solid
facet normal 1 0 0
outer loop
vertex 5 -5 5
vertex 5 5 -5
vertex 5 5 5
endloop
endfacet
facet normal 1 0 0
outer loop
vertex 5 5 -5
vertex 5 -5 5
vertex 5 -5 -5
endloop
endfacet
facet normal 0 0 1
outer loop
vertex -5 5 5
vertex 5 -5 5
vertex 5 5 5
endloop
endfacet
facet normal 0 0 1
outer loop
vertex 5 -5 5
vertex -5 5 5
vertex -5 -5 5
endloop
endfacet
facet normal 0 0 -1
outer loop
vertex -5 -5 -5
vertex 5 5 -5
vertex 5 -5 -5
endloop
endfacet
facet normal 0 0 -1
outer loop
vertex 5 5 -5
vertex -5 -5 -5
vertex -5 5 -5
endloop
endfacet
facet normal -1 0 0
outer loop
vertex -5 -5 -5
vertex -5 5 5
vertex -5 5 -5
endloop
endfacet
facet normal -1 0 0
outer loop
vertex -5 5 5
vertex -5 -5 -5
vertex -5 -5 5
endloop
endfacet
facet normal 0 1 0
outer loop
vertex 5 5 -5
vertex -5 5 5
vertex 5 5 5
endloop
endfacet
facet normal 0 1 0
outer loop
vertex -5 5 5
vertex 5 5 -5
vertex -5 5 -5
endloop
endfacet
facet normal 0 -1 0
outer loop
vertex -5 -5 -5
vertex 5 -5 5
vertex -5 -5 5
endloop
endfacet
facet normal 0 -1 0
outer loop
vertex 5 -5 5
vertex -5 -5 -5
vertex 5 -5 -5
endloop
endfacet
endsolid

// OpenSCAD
// -------------------------------------+---------------------------------------+---------------------------------------+---------------------------------------
// Title:        Parametric Test Block
// Version:      1.2
// Release Date: 2018-07-28 (ISO 8601)
// Author:       Rohin Gosling
// -------------------------------------+---------------------------------------+---------------------------------------+---------------------------------------
//
// Description:
//
// - Simple 3D object generator, to generate test and calibration parts for 3D printers.
//
// Release Notes:
//
// - Version 1.1
//   * Removed extended ASCII characters to make the source code compatible with the UTF-8 encoding required by the Thingiverse Customizer.
//
// - Version 1.0
//   * Model created.
//
// -------------------------------------+---------------------------------------+---------------------------------------+---------------------------------------

// -------------------------------------+---------------------------------------+---------------------------------------+---------------------------------------
// Constants:
// -------------------------------------+---------------------------------------+---------------------------------------+---------------------------------------

// System constants.

C_CONSTANT = 0 + 0;     // Used to hide constant values from Thingiverse. Add to other constants to hide them as well.

// General constants.

C_NONE = C_CONSTANT + 0;

// SCG constants.

SCG_OVERLAP = C_CONSTANT + 0.01;    // Used for overlapping Boolean operations in order to avoid Boolean edge artefacts.

// Shape

C_SHAPE_NONE      = C_CONSTANT + 0;
C_SHAPE_CUBOID    = C_CONSTANT + 1;
C_SHAPE_CYLINDER  = C_CONSTANT + 2;
C_SHAPE_PYRAMID   = C_CONSTANT + 3;
C_SHAPE_PRISM     = C_CONSTANT + 4;
C_SHAPE_ELLIPSOID = C_CONSTANT + 5;
C_SHAPE_TORUS     = C_CONSTANT + 6;

// Minimum and maximum constraints.

C_RESOLUTION_MIN  = C_CONSTANT + 8;
C_RESOLUTION_MAX  = C_CONSTANT + 64;
C_SIZE_MIN        = C_CONSTANT + 1.0;
C_SIDE_COUNT_MIN  = C_CONSTANT + 3;
C_SIDE_COUNT_MAX  = C_CONSTANT + 12;


// -------------------------------------+---------------------------------------+---------------------------------------+---------------------------------------
// Thingiverse Parameters.
//
// - These parameters are used to integrate with the Thingiverse Customizer, and should only be used by the
//   class member variables specified in the "Model parameters" section below.
//
// - These Thingiverse Parameters should never be accessed from inside any module. We do this to enforce 
//   principles of object orientation.
//
// - By separating concerns between variables exposed to Thingiverse vs. variables used internally by the 
//   SCAD model (class), we are better able to manage the ordering and grouping of variables exposed to 
//   Thingiverse, vs. the ordering and constraints of variables used internally by the model.
//
// -------------------------------------+---------------------------------------+---------------------------------------+---------------------------------------

/* [Assembbly Parameters] */

object_shape    = 1;        // [ 1:Cuboid, 2:Cylinder, 3:Pyramid, 4:Prism, 5:Ellipsoid, 6:Torus ]
x_bore_shape    = 0;        // [ 0: None, 2:Cylinder, 4:Prism ]
y_bore_shape    = 0;        // [ 0: None, 2:Cylinder, 4:Prism ]
z_bore_shape    = 0;        // [ 0: None, 2:Cylinder, 4:Prism ]
resolution      = 128;

/* [Cuboid Parameters] */

cuboid_x      = 10.0;
cuboid_y      = 10.0;
cuboid_z      = 10.0;
cuboid_fillet = 0.0;

/* [Cylinder Parameters] */

cylinder_diameter_base = 20.0;
cylinder_diameter_top  = 20.0;
cylinder_height        = 20.0;

/* [Pyramid Parameters] */

pyramid_side_count  = 4;
pyramid_side_length = 20.0;
pyramid_height      = 20.0;

/* [Prism Parameters] */

prism_side_count  = 3;
prism_side_length = 20.0;
prism_height      = 20.0;

/* [Ellipsoid Parameters] */

ellipsoid_diameter_x = 20.0;
ellipsoid_diameter_y = 20.0;
ellipsoid_diameter_z = 20.0;

/* [Torus Parameters] */

torus_major_radius = 12.0;
torus_minor_radius = 6.0;

/* [Bore Parameters] */

x_bore_diameter         = 10;
y_bore_diameter         = 10;
z_bore_diameter         = 10;
x_bore_prism_side_count = 4;
y_bore_prism_side_count = 4;
z_bore_prism_side_count = 4;

// -------------------------------------+---------------------------------------+---------------------------------------+---------------------------------------
// Model parameters and geometric constraints. (Class member variables).
//
// - If we treat an OpenSCAD file as though it is an object oriented class, then we can prefix global variables
//   with "m_", to denote class membership. 
//   - As an alternative to "m_", we could also use "this_" as a standard. However, "m_" is shorter and faster to type.
//   - Another advantage of this convention, is that we can arrange parameters meant for display in Thingiverse, in 
//     an order that makes sense to the user, while arranging the member versions of the parameters in an order
//     that better accommodates constraint computation.
//
// - Once we have defined global variables as member variables of a class, in this case the class represented
//   by the SCAD file, then we are free to better manage global vs local scope of class member 
//   variables, vs. local module (method) variables.
//
// - Thingiverse only integrates constant literal values. So as long as we reference other parameters or 
//   initialize variables as expressions, then none of these will appear in the Thingiverse customizer.
//
// -------------------------------------+---------------------------------------+---------------------------------------+---------------------------------------

// Assembly Parameters

m_object_shape    = object_shape;
m_x_bore_shape    = x_bore_shape;
m_y_bore_shape    = y_bore_shape;
m_z_bore_shape    = z_bore_shape;
m_resolution      = clip ( resolution, C_RESOLUTION_MIN, C_RESOLUTION_MAX );

// Cuboid Parameters.

m_cuboid_x             = ( cuboid_x < C_SIZE_MIN ) ? C_SIZE_MIN : cuboid_x;
m_cuboid_y             = ( cuboid_y < C_SIZE_MIN ) ? C_SIZE_MIN : cuboid_y;
m_cuboid_z             = ( cuboid_z < C_SIZE_MIN ) ? C_SIZE_MIN : cuboid_z;
m_cuboid_min_dimention = ( m_cuboid_x < m_cuboid_y && m_cuboid_x < m_cuboid_z ) ? m_cuboid_x : ( m_cuboid_y < m_cuboid_x && m_cuboid_y < m_cuboid_z ) ? m_cuboid_y : m_cuboid_z;
m_cuboid_fillet        = clip ( cuboid_fillet, 0.0, m_cuboid_min_dimention/2.0 );

// Cylinder Parameters.

m_cylinder_diameter_base = ( cylinder_diameter_base < 0.0 ) ? 0.0 : cylinder_diameter_base;
m_cylinder_diameter_top  = ( cylinder_diameter_top  < 0.0 ) ? 0.0 : cylinder_diameter_top;
m_cylinder_height        = ( cylinder_height < C_SIZE_MIN ) ? C_SIZE_MIN : cylinder_height;

// Pyramid Parameters.

m_pyramid_side_count  = clip ( pyramid_side_count, C_SIDE_COUNT_MIN, C_SIDE_COUNT_MAX );
m_pyramid_side_length = ( pyramid_side_length < C_SIZE_MIN ) ? C_SIZE_MIN : pyramid_side_length;
m_pyramid_height      = ( pyramid_height < C_SIZE_MIN ) ? C_SIZE_MIN : pyramid_height;

// Prism Parameters.

m_prism_side_count  = clip ( prism_side_count, C_SIDE_COUNT_MIN, C_SIDE_COUNT_MAX );
m_prism_side_length = ( prism_side_length < C_SIZE_MIN ) ? C_SIZE_MIN : prism_side_length;
m_prism_height      = ( prism_height < C_SIZE_MIN ) ? C_SIZE_MIN : prism_height;

// Ellipsoid Parameters.

m_ellipsoid_diameter_x = ( ellipsoid_diameter_x < C_SIZE_MIN ) ? C_SIZE_MIN : ellipsoid_diameter_x;
m_ellipsoid_diameter_y = ( ellipsoid_diameter_y < C_SIZE_MIN ) ? C_SIZE_MIN : ellipsoid_diameter_y;
m_ellipsoid_diameter_z = ( ellipsoid_diameter_z < C_SIZE_MIN ) ? C_SIZE_MIN : ellipsoid_diameter_z;

// Torus Parameters.

m_torus_major_radius = ( torus_major_radius < C_SIZE_MIN ) ? C_SIZE_MIN : torus_major_radius;
m_torus_minor_radius = ( torus_minor_radius < C_SIZE_MIN ) ? C_SIZE_MIN : torus_minor_radius;

// Bore.

m_x_bore_diameter         = ( x_bore_diameter < C_SIZE_MIN ) ? C_SIZE_MIN : x_bore_diameter;
m_y_bore_diameter         = ( y_bore_diameter < C_SIZE_MIN ) ? C_SIZE_MIN : y_bore_diameter;
m_z_bore_diameter         = ( z_bore_diameter < C_SIZE_MIN ) ? C_SIZE_MIN : z_bore_diameter;
m_x_bore_prism_side_count = clip ( x_bore_prism_side_count, C_SIDE_COUNT_MIN, C_SIDE_COUNT_MAX );
m_y_bore_prism_side_count = clip ( y_bore_prism_side_count, C_SIDE_COUNT_MIN, C_SIDE_COUNT_MAX );
m_z_bore_prism_side_count = clip ( z_bore_prism_side_count, C_SIDE_COUNT_MIN, C_SIDE_COUNT_MAX );

// -------------------------------------+---------------------------------------+---------------------------------------+---------------------------------------
// DEBUG: Console Output. 
// -------------------------------------+---------------------------------------+---------------------------------------+---------------------------------------

C_DEBUG_ENABLED = false;

if ( C_DEBUG_ENABLED )
{
    //echo ( m_x = m_x ); 
}

// -------------------------------------+---------------------------------------+---------------------------------------+---------------------------------------
// Module:      Main
// Module Type: Model
//
// Description:
//
// - Program entry point.
//
// -------------------------------------+---------------------------------------+---------------------------------------+---------------------------------------

main();

module main ()
{   
    // Initialize model resolution.
    
    $fn = m_resolution;
    
    // Generate hinge assembly.
        
    assembly ();    
}

// -------------------------------------+---------------------------------------+---------------------------------------+---------------------------------------
// Module:      assembly_main
// Module Type: Assembly
//
// Description:
//
// - Main component assembly.
//
// Parameters:
//
// - N/A
//
// -------------------------------------+---------------------------------------+---------------------------------------+---------------------------------------

module assembly ()
{
    if      ( m_object_shape == C_SHAPE_NONE )      object_none ();
    else if ( m_object_shape == C_SHAPE_CUBOID )    object_cuboid ();
    else if ( m_object_shape == C_SHAPE_CYLINDER )  object_cylinder ();
    else if ( m_object_shape == C_SHAPE_PYRAMID )   object_pyramid ();
    else if ( m_object_shape == C_SHAPE_PRISM )     object_prism ();
    else if ( m_object_shape == C_SHAPE_ELLIPSOID ) object_ellipsoid ();
    else if ( m_object_shape == C_SHAPE_TORUS )     object_torus ();    
    else if ( m_object_shape == C_SHAPE_NONE )      object_none ();    
}

// -------------------------------------+---------------------------------------+---------------------------------------+---------------------------------------
// Module:      object_none
// Module Type: Object
//
// Description:
//
// - Placeholder module for dealing with zero object selection.
//
// Parameters:
//
// - N/A
//
// -------------------------------------+---------------------------------------+---------------------------------------+---------------------------------------

module object_none ()
{
}

// -------------------------------------+---------------------------------------+---------------------------------------+---------------------------------------
// Module:      object_cuboid
// Module Type: Object
//
// Description:
//
// - Cuboid object defined by width, length, height and fillet size.
//
// Parameters:
//
// - N/A
//
// -------------------------------------+---------------------------------------+---------------------------------------+---------------------------------------

module object_cuboid ()
{
    // Initialize parameters.
    
    sf = m_cuboid_fillet;
    sx = m_cuboid_x;
    sy = m_cuboid_y;
    sz = m_cuboid_z;
    
    // Generate object.

    difference ()
    {
        // Generate base object.
        
        if ( sf > 0 )
        {
            object_cuboid_filleted ();
        }
        else
        {
            cube ( size = [ sx, sy, sz ], center = true );
        }
        
        // Subtract bores.
        
        cutting_tool_bore ( sx, sy, sz );
    }
}

// -------------------------------------+---------------------------------------+---------------------------------------+---------------------------------------
// Module:      object_cuboid_filleted
// Module Type: Object
//
// Description:
//
// - Used by the Cuboid object, to implement fillets.
//
// Parameters:
//
// - N/A
//
// -------------------------------------+---------------------------------------+---------------------------------------+---------------------------------------

module object_cuboid_filleted ()
{
    // Local constants.
    
    EDGE_CENTER = 0;    
    EDGE_ANGLE  = 1;
    EDGE_LENGTH = 2;
    
    // Initialize parameters.
    
    sf = m_cuboid_fillet;
    sx = m_cuboid_x;
    sy = m_cuboid_y;
    sz = m_cuboid_z;
    
    // Generate object.

    difference ()
    {
        // Generate base object.
        
        union ()
        {
            // Create cube work pieces.
            
            c = 2.0*sf;
            cube ( size = [ sx,     sy - c, sz - c ], center = true );
            cube ( size = [ sx - c, sy - c, sz     ], center = true );
            cube ( size = [ sx - c, sy,     sz - c ], center = true );
            
            // Create fillets.
            
            rx = sx/2.0 - sf;
            ry = sy/2.0 - sf;
            rz = sz/2.0 - sf;
            
            ex = m_cuboid_x - 2.0*sf;
            ey = m_cuboid_y - 2.0*sf;;
            ez = m_cuboid_z - 2.0*sf;;
            
            // Create vertex fillets.
            
            n_vertex = 8;
            v_vertex =
            [
                [ rx, ry,  rz ],[ -rx, ry,  rz ], [ -rx, -ry,  rz ], [ rx, -ry,  rz ],
                [ rx, ry, -rz ],[ -rx, ry, -rz ], [ -rx, -ry, -rz ], [ rx, -ry, -rz ]
            ];
                              
            for ( i = [ 0 : n_vertex - 1 ] )
            {
                translate ( v_vertex [ i ] ) sphere ( r = sf, center = true );
            }
            
            // Create edge fillets.
            
            n_edge = 12;
            v_edge =
            [
                [ [  rx,  ry, 0.0 ], [  0.0,  0.0, 0.0 ], ez ], [ [ -rx,  ry, 0.0 ], [  0.0,  0.0, 0.0 ], ez ],
                [ [  rx, -ry, 0.0 ], [  0.0,  0.0, 0.0 ], ez ], [ [ -rx, -ry, 0.0 ], [  0.0,  0.0, 0.0 ], ez ],
                [ [  rx, 0.0,  rz ], [ 90.0,  0.0, 0.0 ], ey ], [ [  rx, 0.0, -rz ], [ 90.0,  0.0, 0.0 ], ey ],
                [ [ -rx, 0.0,  rz ], [ 90.0,  0.0, 0.0 ], ey ], [ [ -rx, 0.0, -rz ], [ 90.0,  0.0, 0.0 ], ey ],
                [ [ 0.0,  ry,  rz ], [  0.0, 90.0, 0.0 ], ex ], [ [ 0.0,  ry, -rz ], [  0.0, 90.0, 0.0 ], ex ],
                [ [ 0.0, -ry,  rz ], [  0.0, 90.0, 0.0 ], ex ], [ [ 0.0, -ry, -rz ], [  0.0, 90.0, 0.0 ], ex ]
            ];
            
            for ( i = [ 0 : n_edge - 1 ] )
            {
                v = v_edge [ i ][ EDGE_CENTER ];
                a = v_edge [ i ][ EDGE_ANGLE  ];
                s = v_edge [ i ][ EDGE_LENGTH ];
                
                echo ( a = a );
                
                translate ( v ) rotate ( a ) cylinder ( r = sf, h = s, center = true );
            }
            
        }
        
        // Subtract bores.
        
        cutting_tool_bore ( sx, sy, sz );
    }
}

// -------------------------------------+---------------------------------------+---------------------------------------+---------------------------------------
// Module:      object_cylinder
// Module Type: Object
//
// Description:
//
// - Cylinder object defined by base diameter, top diameter and height.
//
// Parameters:
//
// - N/A
//
// -------------------------------------+---------------------------------------+---------------------------------------+---------------------------------------

module object_cylinder ()
{
    // Initialize parameters.
    
    d1 = m_cylinder_diameter_base;
    d2 = m_cylinder_diameter_top;
    h  = m_cylinder_height;
    
    // Generate object.
    
    difference ()
    {
        // Generate base object.
        
        cylinder ( d1 = d1, d2 = d2, h = h, center = true );
        
        // Subtract bores.
        
        d_max = ( d1 > d2 ) ? d1 : d2;
        cutting_tool_bore ( sx = d_max, sy = d_max, sz = h );
    }
}

// -------------------------------------+---------------------------------------+---------------------------------------+---------------------------------------
// Module:      object_pyramid
// Module Type: Object
//
// Description:
//
// - Pyramid object defined by height, side length, and side count.
//
// Parameters:
//
// - N/A
//
// -------------------------------------+---------------------------------------+---------------------------------------+---------------------------------------

module object_pyramid ()
{
    // Initialize parameters.
    
    n = m_pyramid_side_count;    
    s = m_pyramid_side_length;
    h = m_pyramid_height;
    t = 180/n;
    
    // Compute base diameter based on side length.
        
    d1 = s/sin(180/n);
    d2 = 0;
    
    // Generate object.
    
    difference ()
    {
        // Generate base object.
        
        rotate ( [ 0, 0, t ] ) cylinder ( d1 = d1, d2 = d2, h = h, $fn = n, center = true );
        
        // Subtract bores.
        
        d_max = ( d1 > d2 ) ? d1 : d2;
        translate ( [ 0, 0, -h/5 ] ) cutting_tool_bore ( sx = d_max, sy = d_max, sz = 2*h );
    }
}

// -------------------------------------+---------------------------------------+---------------------------------------+---------------------------------------
// Module:      object_prism
// Module Type: Object
//
// Description:
//
// - Prism object defined by height, side length, and side count.
//
// Parameters:
//
// - N/A
//
// -------------------------------------+---------------------------------------+---------------------------------------+---------------------------------------

module object_prism ()
{
    // Initialize parameters.
    
    n = m_prism_side_count;    
    s = m_prism_side_length;
    h = m_prism_height;
    t = 180/n;
    
    // Compute base diameter based on side length.
        
    d1 = s/sin(180/n);
    d2 = d1;
    
    // Generate object.
    
    difference ()
    {
        // Generate base object.
        
        rotate ( [ 0, 0, t ] ) cylinder ( d1 = d1, d2 = d2, h = h, $fn = n, center = true );
        
        // Subtract bores.
                
        cutting_tool_bore ( sx = d1, sy = d1, sz = h );
    }
}

// -------------------------------------+---------------------------------------+---------------------------------------+---------------------------------------
// Module:      object_ellipsoid
// Module Type: Object
//
// Description:
//
// - Ellipsoid object defined by width, length and height.
//
// Parameters:
//
// - N/A
//
// -------------------------------------+---------------------------------------+---------------------------------------+---------------------------------------

module object_ellipsoid ()
{
    // Compute ellipsoid scaling.
     
    d  = 1.0;     
    sx = m_ellipsoid_diameter_x;
    sy = m_ellipsoid_diameter_y;
    sz = m_ellipsoid_diameter_z;
    
    // Generate object.
    
    difference ()
    {
        // Generate base object.
        
        scale ( [ sx, sy, sz ] ) sphere ( d = d );
        
        // Subtract bores.
                
        cutting_tool_bore ( sx = sx, sy = sy, sz = sz );
    } 
}

// -------------------------------------+---------------------------------------+---------------------------------------+---------------------------------------
// Module:      object_torus
// Module Type: Object
//
// Description:
//
// - Torus object defined by major and minor radii.
//
// Parameters:
//
// - N/A
//
// -------------------------------------+---------------------------------------+---------------------------------------+---------------------------------------

module object_torus ()
{
    // Initialize parameters.
    
    R = m_torus_major_radius;
    r = m_torus_minor_radius;    
    
    // Generate object.
    
    difference ()
    {
        // Generate base object.
        
        rotate_extrude ()
        {
            translate ( [ R, 0, 0 ] ) circle ( r = r);
        }
        
        // Subtract bores.
        
        s  = 2*( r + R );
        sx = s;
        sy = s;
        sz = 2*r;
        
        cutting_tool_bore ( sx = sx, sy = sy, sz = sz );
    } 
}

// -------------------------------------+---------------------------------------+---------------------------------------+---------------------------------------
// Module:      cutting_tool_bore
// Module Type: Cutting tool
//
// Description:
//
// - Cutting tool used to cut the bore holes into the base object.
//
// Parameters:
//
// - N/A
//
// -------------------------------------+---------------------------------------+---------------------------------------+---------------------------------------

module cutting_tool_bore ( sx, sy, sz )
{
    nx = m_x_bore_prism_side_count;
    ny = m_y_bore_prism_side_count;
    nz = m_z_bore_prism_side_count;
    
    txo = ( nx == 6 ) ? 90.0 :   0.0;
    tyo = ( ny == 6 ) ? 0.0  : -90.0;
    
    tx = 180/nx + txo;
    ty = 180/ny + tyo;
    tz = 180/nz;
            
    // Subtract cylindrical bores.
        
    if ( m_x_bore_shape == C_SHAPE_CYLINDER ) rotate ( [ 0, 90, 0 ] ) cylinder ( d = m_x_bore_diameter, h = sx + SCG_OVERLAP, center = true );
    if ( m_y_bore_shape == C_SHAPE_CYLINDER ) rotate ( [ 90, 0, 0 ] ) cylinder ( d = m_y_bore_diameter, h = sy + SCG_OVERLAP, center = true );
    if ( m_z_bore_shape == C_SHAPE_CYLINDER ) rotate ( [ 0,  0, 0 ] ) cylinder ( d = m_z_bore_diameter, h = sz + SCG_OVERLAP, center = true );
            
    // Subtract prisim bores.
    
    if ( m_x_bore_shape == C_SHAPE_PRISM ) rotate ( [ 0, 90, 0 ] ) rotate ( [ 0, 0, tx ] ) cylinder ( d = m_x_bore_diameter, h = sx + SCG_OVERLAP, $fn = nx, center = true );
    if ( m_y_bore_shape == C_SHAPE_PRISM ) rotate ( [ 90, 0, 0 ] ) rotate ( [ 0, 0, ty ] ) cylinder ( d = m_y_bore_diameter, h = sy + SCG_OVERLAP, $fn = ny, center = true );
    if ( m_z_bore_shape == C_SHAPE_PRISM ) rotate ( [ 0,  0, 0 ] ) rotate ( [ 0, 0, tz ] ) cylinder ( d = m_z_bore_diameter, h = sz + SCG_OVERLAP, $fn = nz, center = true );
}


// -------------------------------------+---------------------------------------+---------------------------------------+---------------------------------------
// Module:      Rectangle.
// Module Type: 2D Shape.
//
// Description:
//
// - Creates a 2D rectangle.
//
// Parameters:
//
// - w
//   Rectangle width.
//
// - h
//   Rectangle height.
//
// - center
//   Center the rectangle about the origin (0,0,0) if true, else place the rectangle in the positive quadrant.
//
// -------------------------------------+---------------------------------------+---------------------------------------+---------------------------------------

module fillet_rectangle ( w, h, r, center )
{
    xs = w - 2*r;
    ys = h - 2*r;
    xd = w/2.0 - r;  
    yd = h/2.0 - r;    
    
    union ()
    {
        scale ( [ xs, h  ] ) square ( size = 1.0, center = center );
        scale ( [ w,  ys ] ) square ( size = 1.0, center = center );
        translate ( [  xd,  yd ] ) circle ( r = r, center = center );
        translate ( [  xd, -yd ] ) circle ( r = r, center = center );
        translate ( [ -xd, -yd ] ) circle ( r = r, center = center );
        translate ( [ -xd,  yd ] ) circle ( r = r, center = center );
    }
}

// -------------------------------------+---------------------------------------+---------------------------------------+---------------------------------------
// Module:      Rectangle.
// Module Type: 2D Shape.
//
// Description:
//
// - Creates a 2D rectangle.
//
// Parameters:
//
// - w
//   Rectangle width.
//
// - h
//   Rectangle height.
//
// - center
//   Center the rectangle about the origin (0,0,0) if true, else place the rectangle in the positive quadrant.
//
// -------------------------------------+---------------------------------------+---------------------------------------+---------------------------------------

module rectangle ( w, h, center )
{
    scale ( [ w, h ] ) square ( size = 1.0, center = center );
}

// -------------------------------------+---------------------------------------+---------------------------------------+---------------------------------------
// Function: Clip
//
// Description:
//
// - Clips an input value, to a minimum and maximum value.
//
//   x_min <= x <= x_max
// 
// Parameters:
//
// - x
//   Input value.
//
// - x_min
//   Minimal value constraint. Any x less than x_min, is set to x_min. 
//
// - x_max
//   Maximum value constraint. Any x greater than x_max, is set to x_max.
//
// -------------------------------------+---------------------------------------+---------------------------------------+---------------------------------------

function clip ( x, x_min, x_max ) = ( x < x_min ) ? x_min : ( x > x_max ) ? x_max : x;


// -------------------------------------+---------------------------------------+---------------------------------------+---------------------------------------
// Function: funtion_name
//
// Description:
//
// - Function description.
//
// Return Value:
//
// - Description of return value.
//
// Parameters:
//
// - x
//   Argument x description.
//
// - y
//   Argument y description.
//
// -------------------------------------+---------------------------------------+---------------------------------------+---------------------------------------

// -------------------------------------+---------------------------------------+---------------------------------------+---------------------------------------
// Module:      module_name
// Module Type: [ 2D Shape, Profile, Tool, Workpiece, Component ] 
// Description:
//
// - Module description.
//
// Parameters:
//
// - x
//   Argument x description.
//
// - y
//   Argument y description.
//
// -------------------------------------+---------------------------------------+---------------------------------------+---------------------------------------
